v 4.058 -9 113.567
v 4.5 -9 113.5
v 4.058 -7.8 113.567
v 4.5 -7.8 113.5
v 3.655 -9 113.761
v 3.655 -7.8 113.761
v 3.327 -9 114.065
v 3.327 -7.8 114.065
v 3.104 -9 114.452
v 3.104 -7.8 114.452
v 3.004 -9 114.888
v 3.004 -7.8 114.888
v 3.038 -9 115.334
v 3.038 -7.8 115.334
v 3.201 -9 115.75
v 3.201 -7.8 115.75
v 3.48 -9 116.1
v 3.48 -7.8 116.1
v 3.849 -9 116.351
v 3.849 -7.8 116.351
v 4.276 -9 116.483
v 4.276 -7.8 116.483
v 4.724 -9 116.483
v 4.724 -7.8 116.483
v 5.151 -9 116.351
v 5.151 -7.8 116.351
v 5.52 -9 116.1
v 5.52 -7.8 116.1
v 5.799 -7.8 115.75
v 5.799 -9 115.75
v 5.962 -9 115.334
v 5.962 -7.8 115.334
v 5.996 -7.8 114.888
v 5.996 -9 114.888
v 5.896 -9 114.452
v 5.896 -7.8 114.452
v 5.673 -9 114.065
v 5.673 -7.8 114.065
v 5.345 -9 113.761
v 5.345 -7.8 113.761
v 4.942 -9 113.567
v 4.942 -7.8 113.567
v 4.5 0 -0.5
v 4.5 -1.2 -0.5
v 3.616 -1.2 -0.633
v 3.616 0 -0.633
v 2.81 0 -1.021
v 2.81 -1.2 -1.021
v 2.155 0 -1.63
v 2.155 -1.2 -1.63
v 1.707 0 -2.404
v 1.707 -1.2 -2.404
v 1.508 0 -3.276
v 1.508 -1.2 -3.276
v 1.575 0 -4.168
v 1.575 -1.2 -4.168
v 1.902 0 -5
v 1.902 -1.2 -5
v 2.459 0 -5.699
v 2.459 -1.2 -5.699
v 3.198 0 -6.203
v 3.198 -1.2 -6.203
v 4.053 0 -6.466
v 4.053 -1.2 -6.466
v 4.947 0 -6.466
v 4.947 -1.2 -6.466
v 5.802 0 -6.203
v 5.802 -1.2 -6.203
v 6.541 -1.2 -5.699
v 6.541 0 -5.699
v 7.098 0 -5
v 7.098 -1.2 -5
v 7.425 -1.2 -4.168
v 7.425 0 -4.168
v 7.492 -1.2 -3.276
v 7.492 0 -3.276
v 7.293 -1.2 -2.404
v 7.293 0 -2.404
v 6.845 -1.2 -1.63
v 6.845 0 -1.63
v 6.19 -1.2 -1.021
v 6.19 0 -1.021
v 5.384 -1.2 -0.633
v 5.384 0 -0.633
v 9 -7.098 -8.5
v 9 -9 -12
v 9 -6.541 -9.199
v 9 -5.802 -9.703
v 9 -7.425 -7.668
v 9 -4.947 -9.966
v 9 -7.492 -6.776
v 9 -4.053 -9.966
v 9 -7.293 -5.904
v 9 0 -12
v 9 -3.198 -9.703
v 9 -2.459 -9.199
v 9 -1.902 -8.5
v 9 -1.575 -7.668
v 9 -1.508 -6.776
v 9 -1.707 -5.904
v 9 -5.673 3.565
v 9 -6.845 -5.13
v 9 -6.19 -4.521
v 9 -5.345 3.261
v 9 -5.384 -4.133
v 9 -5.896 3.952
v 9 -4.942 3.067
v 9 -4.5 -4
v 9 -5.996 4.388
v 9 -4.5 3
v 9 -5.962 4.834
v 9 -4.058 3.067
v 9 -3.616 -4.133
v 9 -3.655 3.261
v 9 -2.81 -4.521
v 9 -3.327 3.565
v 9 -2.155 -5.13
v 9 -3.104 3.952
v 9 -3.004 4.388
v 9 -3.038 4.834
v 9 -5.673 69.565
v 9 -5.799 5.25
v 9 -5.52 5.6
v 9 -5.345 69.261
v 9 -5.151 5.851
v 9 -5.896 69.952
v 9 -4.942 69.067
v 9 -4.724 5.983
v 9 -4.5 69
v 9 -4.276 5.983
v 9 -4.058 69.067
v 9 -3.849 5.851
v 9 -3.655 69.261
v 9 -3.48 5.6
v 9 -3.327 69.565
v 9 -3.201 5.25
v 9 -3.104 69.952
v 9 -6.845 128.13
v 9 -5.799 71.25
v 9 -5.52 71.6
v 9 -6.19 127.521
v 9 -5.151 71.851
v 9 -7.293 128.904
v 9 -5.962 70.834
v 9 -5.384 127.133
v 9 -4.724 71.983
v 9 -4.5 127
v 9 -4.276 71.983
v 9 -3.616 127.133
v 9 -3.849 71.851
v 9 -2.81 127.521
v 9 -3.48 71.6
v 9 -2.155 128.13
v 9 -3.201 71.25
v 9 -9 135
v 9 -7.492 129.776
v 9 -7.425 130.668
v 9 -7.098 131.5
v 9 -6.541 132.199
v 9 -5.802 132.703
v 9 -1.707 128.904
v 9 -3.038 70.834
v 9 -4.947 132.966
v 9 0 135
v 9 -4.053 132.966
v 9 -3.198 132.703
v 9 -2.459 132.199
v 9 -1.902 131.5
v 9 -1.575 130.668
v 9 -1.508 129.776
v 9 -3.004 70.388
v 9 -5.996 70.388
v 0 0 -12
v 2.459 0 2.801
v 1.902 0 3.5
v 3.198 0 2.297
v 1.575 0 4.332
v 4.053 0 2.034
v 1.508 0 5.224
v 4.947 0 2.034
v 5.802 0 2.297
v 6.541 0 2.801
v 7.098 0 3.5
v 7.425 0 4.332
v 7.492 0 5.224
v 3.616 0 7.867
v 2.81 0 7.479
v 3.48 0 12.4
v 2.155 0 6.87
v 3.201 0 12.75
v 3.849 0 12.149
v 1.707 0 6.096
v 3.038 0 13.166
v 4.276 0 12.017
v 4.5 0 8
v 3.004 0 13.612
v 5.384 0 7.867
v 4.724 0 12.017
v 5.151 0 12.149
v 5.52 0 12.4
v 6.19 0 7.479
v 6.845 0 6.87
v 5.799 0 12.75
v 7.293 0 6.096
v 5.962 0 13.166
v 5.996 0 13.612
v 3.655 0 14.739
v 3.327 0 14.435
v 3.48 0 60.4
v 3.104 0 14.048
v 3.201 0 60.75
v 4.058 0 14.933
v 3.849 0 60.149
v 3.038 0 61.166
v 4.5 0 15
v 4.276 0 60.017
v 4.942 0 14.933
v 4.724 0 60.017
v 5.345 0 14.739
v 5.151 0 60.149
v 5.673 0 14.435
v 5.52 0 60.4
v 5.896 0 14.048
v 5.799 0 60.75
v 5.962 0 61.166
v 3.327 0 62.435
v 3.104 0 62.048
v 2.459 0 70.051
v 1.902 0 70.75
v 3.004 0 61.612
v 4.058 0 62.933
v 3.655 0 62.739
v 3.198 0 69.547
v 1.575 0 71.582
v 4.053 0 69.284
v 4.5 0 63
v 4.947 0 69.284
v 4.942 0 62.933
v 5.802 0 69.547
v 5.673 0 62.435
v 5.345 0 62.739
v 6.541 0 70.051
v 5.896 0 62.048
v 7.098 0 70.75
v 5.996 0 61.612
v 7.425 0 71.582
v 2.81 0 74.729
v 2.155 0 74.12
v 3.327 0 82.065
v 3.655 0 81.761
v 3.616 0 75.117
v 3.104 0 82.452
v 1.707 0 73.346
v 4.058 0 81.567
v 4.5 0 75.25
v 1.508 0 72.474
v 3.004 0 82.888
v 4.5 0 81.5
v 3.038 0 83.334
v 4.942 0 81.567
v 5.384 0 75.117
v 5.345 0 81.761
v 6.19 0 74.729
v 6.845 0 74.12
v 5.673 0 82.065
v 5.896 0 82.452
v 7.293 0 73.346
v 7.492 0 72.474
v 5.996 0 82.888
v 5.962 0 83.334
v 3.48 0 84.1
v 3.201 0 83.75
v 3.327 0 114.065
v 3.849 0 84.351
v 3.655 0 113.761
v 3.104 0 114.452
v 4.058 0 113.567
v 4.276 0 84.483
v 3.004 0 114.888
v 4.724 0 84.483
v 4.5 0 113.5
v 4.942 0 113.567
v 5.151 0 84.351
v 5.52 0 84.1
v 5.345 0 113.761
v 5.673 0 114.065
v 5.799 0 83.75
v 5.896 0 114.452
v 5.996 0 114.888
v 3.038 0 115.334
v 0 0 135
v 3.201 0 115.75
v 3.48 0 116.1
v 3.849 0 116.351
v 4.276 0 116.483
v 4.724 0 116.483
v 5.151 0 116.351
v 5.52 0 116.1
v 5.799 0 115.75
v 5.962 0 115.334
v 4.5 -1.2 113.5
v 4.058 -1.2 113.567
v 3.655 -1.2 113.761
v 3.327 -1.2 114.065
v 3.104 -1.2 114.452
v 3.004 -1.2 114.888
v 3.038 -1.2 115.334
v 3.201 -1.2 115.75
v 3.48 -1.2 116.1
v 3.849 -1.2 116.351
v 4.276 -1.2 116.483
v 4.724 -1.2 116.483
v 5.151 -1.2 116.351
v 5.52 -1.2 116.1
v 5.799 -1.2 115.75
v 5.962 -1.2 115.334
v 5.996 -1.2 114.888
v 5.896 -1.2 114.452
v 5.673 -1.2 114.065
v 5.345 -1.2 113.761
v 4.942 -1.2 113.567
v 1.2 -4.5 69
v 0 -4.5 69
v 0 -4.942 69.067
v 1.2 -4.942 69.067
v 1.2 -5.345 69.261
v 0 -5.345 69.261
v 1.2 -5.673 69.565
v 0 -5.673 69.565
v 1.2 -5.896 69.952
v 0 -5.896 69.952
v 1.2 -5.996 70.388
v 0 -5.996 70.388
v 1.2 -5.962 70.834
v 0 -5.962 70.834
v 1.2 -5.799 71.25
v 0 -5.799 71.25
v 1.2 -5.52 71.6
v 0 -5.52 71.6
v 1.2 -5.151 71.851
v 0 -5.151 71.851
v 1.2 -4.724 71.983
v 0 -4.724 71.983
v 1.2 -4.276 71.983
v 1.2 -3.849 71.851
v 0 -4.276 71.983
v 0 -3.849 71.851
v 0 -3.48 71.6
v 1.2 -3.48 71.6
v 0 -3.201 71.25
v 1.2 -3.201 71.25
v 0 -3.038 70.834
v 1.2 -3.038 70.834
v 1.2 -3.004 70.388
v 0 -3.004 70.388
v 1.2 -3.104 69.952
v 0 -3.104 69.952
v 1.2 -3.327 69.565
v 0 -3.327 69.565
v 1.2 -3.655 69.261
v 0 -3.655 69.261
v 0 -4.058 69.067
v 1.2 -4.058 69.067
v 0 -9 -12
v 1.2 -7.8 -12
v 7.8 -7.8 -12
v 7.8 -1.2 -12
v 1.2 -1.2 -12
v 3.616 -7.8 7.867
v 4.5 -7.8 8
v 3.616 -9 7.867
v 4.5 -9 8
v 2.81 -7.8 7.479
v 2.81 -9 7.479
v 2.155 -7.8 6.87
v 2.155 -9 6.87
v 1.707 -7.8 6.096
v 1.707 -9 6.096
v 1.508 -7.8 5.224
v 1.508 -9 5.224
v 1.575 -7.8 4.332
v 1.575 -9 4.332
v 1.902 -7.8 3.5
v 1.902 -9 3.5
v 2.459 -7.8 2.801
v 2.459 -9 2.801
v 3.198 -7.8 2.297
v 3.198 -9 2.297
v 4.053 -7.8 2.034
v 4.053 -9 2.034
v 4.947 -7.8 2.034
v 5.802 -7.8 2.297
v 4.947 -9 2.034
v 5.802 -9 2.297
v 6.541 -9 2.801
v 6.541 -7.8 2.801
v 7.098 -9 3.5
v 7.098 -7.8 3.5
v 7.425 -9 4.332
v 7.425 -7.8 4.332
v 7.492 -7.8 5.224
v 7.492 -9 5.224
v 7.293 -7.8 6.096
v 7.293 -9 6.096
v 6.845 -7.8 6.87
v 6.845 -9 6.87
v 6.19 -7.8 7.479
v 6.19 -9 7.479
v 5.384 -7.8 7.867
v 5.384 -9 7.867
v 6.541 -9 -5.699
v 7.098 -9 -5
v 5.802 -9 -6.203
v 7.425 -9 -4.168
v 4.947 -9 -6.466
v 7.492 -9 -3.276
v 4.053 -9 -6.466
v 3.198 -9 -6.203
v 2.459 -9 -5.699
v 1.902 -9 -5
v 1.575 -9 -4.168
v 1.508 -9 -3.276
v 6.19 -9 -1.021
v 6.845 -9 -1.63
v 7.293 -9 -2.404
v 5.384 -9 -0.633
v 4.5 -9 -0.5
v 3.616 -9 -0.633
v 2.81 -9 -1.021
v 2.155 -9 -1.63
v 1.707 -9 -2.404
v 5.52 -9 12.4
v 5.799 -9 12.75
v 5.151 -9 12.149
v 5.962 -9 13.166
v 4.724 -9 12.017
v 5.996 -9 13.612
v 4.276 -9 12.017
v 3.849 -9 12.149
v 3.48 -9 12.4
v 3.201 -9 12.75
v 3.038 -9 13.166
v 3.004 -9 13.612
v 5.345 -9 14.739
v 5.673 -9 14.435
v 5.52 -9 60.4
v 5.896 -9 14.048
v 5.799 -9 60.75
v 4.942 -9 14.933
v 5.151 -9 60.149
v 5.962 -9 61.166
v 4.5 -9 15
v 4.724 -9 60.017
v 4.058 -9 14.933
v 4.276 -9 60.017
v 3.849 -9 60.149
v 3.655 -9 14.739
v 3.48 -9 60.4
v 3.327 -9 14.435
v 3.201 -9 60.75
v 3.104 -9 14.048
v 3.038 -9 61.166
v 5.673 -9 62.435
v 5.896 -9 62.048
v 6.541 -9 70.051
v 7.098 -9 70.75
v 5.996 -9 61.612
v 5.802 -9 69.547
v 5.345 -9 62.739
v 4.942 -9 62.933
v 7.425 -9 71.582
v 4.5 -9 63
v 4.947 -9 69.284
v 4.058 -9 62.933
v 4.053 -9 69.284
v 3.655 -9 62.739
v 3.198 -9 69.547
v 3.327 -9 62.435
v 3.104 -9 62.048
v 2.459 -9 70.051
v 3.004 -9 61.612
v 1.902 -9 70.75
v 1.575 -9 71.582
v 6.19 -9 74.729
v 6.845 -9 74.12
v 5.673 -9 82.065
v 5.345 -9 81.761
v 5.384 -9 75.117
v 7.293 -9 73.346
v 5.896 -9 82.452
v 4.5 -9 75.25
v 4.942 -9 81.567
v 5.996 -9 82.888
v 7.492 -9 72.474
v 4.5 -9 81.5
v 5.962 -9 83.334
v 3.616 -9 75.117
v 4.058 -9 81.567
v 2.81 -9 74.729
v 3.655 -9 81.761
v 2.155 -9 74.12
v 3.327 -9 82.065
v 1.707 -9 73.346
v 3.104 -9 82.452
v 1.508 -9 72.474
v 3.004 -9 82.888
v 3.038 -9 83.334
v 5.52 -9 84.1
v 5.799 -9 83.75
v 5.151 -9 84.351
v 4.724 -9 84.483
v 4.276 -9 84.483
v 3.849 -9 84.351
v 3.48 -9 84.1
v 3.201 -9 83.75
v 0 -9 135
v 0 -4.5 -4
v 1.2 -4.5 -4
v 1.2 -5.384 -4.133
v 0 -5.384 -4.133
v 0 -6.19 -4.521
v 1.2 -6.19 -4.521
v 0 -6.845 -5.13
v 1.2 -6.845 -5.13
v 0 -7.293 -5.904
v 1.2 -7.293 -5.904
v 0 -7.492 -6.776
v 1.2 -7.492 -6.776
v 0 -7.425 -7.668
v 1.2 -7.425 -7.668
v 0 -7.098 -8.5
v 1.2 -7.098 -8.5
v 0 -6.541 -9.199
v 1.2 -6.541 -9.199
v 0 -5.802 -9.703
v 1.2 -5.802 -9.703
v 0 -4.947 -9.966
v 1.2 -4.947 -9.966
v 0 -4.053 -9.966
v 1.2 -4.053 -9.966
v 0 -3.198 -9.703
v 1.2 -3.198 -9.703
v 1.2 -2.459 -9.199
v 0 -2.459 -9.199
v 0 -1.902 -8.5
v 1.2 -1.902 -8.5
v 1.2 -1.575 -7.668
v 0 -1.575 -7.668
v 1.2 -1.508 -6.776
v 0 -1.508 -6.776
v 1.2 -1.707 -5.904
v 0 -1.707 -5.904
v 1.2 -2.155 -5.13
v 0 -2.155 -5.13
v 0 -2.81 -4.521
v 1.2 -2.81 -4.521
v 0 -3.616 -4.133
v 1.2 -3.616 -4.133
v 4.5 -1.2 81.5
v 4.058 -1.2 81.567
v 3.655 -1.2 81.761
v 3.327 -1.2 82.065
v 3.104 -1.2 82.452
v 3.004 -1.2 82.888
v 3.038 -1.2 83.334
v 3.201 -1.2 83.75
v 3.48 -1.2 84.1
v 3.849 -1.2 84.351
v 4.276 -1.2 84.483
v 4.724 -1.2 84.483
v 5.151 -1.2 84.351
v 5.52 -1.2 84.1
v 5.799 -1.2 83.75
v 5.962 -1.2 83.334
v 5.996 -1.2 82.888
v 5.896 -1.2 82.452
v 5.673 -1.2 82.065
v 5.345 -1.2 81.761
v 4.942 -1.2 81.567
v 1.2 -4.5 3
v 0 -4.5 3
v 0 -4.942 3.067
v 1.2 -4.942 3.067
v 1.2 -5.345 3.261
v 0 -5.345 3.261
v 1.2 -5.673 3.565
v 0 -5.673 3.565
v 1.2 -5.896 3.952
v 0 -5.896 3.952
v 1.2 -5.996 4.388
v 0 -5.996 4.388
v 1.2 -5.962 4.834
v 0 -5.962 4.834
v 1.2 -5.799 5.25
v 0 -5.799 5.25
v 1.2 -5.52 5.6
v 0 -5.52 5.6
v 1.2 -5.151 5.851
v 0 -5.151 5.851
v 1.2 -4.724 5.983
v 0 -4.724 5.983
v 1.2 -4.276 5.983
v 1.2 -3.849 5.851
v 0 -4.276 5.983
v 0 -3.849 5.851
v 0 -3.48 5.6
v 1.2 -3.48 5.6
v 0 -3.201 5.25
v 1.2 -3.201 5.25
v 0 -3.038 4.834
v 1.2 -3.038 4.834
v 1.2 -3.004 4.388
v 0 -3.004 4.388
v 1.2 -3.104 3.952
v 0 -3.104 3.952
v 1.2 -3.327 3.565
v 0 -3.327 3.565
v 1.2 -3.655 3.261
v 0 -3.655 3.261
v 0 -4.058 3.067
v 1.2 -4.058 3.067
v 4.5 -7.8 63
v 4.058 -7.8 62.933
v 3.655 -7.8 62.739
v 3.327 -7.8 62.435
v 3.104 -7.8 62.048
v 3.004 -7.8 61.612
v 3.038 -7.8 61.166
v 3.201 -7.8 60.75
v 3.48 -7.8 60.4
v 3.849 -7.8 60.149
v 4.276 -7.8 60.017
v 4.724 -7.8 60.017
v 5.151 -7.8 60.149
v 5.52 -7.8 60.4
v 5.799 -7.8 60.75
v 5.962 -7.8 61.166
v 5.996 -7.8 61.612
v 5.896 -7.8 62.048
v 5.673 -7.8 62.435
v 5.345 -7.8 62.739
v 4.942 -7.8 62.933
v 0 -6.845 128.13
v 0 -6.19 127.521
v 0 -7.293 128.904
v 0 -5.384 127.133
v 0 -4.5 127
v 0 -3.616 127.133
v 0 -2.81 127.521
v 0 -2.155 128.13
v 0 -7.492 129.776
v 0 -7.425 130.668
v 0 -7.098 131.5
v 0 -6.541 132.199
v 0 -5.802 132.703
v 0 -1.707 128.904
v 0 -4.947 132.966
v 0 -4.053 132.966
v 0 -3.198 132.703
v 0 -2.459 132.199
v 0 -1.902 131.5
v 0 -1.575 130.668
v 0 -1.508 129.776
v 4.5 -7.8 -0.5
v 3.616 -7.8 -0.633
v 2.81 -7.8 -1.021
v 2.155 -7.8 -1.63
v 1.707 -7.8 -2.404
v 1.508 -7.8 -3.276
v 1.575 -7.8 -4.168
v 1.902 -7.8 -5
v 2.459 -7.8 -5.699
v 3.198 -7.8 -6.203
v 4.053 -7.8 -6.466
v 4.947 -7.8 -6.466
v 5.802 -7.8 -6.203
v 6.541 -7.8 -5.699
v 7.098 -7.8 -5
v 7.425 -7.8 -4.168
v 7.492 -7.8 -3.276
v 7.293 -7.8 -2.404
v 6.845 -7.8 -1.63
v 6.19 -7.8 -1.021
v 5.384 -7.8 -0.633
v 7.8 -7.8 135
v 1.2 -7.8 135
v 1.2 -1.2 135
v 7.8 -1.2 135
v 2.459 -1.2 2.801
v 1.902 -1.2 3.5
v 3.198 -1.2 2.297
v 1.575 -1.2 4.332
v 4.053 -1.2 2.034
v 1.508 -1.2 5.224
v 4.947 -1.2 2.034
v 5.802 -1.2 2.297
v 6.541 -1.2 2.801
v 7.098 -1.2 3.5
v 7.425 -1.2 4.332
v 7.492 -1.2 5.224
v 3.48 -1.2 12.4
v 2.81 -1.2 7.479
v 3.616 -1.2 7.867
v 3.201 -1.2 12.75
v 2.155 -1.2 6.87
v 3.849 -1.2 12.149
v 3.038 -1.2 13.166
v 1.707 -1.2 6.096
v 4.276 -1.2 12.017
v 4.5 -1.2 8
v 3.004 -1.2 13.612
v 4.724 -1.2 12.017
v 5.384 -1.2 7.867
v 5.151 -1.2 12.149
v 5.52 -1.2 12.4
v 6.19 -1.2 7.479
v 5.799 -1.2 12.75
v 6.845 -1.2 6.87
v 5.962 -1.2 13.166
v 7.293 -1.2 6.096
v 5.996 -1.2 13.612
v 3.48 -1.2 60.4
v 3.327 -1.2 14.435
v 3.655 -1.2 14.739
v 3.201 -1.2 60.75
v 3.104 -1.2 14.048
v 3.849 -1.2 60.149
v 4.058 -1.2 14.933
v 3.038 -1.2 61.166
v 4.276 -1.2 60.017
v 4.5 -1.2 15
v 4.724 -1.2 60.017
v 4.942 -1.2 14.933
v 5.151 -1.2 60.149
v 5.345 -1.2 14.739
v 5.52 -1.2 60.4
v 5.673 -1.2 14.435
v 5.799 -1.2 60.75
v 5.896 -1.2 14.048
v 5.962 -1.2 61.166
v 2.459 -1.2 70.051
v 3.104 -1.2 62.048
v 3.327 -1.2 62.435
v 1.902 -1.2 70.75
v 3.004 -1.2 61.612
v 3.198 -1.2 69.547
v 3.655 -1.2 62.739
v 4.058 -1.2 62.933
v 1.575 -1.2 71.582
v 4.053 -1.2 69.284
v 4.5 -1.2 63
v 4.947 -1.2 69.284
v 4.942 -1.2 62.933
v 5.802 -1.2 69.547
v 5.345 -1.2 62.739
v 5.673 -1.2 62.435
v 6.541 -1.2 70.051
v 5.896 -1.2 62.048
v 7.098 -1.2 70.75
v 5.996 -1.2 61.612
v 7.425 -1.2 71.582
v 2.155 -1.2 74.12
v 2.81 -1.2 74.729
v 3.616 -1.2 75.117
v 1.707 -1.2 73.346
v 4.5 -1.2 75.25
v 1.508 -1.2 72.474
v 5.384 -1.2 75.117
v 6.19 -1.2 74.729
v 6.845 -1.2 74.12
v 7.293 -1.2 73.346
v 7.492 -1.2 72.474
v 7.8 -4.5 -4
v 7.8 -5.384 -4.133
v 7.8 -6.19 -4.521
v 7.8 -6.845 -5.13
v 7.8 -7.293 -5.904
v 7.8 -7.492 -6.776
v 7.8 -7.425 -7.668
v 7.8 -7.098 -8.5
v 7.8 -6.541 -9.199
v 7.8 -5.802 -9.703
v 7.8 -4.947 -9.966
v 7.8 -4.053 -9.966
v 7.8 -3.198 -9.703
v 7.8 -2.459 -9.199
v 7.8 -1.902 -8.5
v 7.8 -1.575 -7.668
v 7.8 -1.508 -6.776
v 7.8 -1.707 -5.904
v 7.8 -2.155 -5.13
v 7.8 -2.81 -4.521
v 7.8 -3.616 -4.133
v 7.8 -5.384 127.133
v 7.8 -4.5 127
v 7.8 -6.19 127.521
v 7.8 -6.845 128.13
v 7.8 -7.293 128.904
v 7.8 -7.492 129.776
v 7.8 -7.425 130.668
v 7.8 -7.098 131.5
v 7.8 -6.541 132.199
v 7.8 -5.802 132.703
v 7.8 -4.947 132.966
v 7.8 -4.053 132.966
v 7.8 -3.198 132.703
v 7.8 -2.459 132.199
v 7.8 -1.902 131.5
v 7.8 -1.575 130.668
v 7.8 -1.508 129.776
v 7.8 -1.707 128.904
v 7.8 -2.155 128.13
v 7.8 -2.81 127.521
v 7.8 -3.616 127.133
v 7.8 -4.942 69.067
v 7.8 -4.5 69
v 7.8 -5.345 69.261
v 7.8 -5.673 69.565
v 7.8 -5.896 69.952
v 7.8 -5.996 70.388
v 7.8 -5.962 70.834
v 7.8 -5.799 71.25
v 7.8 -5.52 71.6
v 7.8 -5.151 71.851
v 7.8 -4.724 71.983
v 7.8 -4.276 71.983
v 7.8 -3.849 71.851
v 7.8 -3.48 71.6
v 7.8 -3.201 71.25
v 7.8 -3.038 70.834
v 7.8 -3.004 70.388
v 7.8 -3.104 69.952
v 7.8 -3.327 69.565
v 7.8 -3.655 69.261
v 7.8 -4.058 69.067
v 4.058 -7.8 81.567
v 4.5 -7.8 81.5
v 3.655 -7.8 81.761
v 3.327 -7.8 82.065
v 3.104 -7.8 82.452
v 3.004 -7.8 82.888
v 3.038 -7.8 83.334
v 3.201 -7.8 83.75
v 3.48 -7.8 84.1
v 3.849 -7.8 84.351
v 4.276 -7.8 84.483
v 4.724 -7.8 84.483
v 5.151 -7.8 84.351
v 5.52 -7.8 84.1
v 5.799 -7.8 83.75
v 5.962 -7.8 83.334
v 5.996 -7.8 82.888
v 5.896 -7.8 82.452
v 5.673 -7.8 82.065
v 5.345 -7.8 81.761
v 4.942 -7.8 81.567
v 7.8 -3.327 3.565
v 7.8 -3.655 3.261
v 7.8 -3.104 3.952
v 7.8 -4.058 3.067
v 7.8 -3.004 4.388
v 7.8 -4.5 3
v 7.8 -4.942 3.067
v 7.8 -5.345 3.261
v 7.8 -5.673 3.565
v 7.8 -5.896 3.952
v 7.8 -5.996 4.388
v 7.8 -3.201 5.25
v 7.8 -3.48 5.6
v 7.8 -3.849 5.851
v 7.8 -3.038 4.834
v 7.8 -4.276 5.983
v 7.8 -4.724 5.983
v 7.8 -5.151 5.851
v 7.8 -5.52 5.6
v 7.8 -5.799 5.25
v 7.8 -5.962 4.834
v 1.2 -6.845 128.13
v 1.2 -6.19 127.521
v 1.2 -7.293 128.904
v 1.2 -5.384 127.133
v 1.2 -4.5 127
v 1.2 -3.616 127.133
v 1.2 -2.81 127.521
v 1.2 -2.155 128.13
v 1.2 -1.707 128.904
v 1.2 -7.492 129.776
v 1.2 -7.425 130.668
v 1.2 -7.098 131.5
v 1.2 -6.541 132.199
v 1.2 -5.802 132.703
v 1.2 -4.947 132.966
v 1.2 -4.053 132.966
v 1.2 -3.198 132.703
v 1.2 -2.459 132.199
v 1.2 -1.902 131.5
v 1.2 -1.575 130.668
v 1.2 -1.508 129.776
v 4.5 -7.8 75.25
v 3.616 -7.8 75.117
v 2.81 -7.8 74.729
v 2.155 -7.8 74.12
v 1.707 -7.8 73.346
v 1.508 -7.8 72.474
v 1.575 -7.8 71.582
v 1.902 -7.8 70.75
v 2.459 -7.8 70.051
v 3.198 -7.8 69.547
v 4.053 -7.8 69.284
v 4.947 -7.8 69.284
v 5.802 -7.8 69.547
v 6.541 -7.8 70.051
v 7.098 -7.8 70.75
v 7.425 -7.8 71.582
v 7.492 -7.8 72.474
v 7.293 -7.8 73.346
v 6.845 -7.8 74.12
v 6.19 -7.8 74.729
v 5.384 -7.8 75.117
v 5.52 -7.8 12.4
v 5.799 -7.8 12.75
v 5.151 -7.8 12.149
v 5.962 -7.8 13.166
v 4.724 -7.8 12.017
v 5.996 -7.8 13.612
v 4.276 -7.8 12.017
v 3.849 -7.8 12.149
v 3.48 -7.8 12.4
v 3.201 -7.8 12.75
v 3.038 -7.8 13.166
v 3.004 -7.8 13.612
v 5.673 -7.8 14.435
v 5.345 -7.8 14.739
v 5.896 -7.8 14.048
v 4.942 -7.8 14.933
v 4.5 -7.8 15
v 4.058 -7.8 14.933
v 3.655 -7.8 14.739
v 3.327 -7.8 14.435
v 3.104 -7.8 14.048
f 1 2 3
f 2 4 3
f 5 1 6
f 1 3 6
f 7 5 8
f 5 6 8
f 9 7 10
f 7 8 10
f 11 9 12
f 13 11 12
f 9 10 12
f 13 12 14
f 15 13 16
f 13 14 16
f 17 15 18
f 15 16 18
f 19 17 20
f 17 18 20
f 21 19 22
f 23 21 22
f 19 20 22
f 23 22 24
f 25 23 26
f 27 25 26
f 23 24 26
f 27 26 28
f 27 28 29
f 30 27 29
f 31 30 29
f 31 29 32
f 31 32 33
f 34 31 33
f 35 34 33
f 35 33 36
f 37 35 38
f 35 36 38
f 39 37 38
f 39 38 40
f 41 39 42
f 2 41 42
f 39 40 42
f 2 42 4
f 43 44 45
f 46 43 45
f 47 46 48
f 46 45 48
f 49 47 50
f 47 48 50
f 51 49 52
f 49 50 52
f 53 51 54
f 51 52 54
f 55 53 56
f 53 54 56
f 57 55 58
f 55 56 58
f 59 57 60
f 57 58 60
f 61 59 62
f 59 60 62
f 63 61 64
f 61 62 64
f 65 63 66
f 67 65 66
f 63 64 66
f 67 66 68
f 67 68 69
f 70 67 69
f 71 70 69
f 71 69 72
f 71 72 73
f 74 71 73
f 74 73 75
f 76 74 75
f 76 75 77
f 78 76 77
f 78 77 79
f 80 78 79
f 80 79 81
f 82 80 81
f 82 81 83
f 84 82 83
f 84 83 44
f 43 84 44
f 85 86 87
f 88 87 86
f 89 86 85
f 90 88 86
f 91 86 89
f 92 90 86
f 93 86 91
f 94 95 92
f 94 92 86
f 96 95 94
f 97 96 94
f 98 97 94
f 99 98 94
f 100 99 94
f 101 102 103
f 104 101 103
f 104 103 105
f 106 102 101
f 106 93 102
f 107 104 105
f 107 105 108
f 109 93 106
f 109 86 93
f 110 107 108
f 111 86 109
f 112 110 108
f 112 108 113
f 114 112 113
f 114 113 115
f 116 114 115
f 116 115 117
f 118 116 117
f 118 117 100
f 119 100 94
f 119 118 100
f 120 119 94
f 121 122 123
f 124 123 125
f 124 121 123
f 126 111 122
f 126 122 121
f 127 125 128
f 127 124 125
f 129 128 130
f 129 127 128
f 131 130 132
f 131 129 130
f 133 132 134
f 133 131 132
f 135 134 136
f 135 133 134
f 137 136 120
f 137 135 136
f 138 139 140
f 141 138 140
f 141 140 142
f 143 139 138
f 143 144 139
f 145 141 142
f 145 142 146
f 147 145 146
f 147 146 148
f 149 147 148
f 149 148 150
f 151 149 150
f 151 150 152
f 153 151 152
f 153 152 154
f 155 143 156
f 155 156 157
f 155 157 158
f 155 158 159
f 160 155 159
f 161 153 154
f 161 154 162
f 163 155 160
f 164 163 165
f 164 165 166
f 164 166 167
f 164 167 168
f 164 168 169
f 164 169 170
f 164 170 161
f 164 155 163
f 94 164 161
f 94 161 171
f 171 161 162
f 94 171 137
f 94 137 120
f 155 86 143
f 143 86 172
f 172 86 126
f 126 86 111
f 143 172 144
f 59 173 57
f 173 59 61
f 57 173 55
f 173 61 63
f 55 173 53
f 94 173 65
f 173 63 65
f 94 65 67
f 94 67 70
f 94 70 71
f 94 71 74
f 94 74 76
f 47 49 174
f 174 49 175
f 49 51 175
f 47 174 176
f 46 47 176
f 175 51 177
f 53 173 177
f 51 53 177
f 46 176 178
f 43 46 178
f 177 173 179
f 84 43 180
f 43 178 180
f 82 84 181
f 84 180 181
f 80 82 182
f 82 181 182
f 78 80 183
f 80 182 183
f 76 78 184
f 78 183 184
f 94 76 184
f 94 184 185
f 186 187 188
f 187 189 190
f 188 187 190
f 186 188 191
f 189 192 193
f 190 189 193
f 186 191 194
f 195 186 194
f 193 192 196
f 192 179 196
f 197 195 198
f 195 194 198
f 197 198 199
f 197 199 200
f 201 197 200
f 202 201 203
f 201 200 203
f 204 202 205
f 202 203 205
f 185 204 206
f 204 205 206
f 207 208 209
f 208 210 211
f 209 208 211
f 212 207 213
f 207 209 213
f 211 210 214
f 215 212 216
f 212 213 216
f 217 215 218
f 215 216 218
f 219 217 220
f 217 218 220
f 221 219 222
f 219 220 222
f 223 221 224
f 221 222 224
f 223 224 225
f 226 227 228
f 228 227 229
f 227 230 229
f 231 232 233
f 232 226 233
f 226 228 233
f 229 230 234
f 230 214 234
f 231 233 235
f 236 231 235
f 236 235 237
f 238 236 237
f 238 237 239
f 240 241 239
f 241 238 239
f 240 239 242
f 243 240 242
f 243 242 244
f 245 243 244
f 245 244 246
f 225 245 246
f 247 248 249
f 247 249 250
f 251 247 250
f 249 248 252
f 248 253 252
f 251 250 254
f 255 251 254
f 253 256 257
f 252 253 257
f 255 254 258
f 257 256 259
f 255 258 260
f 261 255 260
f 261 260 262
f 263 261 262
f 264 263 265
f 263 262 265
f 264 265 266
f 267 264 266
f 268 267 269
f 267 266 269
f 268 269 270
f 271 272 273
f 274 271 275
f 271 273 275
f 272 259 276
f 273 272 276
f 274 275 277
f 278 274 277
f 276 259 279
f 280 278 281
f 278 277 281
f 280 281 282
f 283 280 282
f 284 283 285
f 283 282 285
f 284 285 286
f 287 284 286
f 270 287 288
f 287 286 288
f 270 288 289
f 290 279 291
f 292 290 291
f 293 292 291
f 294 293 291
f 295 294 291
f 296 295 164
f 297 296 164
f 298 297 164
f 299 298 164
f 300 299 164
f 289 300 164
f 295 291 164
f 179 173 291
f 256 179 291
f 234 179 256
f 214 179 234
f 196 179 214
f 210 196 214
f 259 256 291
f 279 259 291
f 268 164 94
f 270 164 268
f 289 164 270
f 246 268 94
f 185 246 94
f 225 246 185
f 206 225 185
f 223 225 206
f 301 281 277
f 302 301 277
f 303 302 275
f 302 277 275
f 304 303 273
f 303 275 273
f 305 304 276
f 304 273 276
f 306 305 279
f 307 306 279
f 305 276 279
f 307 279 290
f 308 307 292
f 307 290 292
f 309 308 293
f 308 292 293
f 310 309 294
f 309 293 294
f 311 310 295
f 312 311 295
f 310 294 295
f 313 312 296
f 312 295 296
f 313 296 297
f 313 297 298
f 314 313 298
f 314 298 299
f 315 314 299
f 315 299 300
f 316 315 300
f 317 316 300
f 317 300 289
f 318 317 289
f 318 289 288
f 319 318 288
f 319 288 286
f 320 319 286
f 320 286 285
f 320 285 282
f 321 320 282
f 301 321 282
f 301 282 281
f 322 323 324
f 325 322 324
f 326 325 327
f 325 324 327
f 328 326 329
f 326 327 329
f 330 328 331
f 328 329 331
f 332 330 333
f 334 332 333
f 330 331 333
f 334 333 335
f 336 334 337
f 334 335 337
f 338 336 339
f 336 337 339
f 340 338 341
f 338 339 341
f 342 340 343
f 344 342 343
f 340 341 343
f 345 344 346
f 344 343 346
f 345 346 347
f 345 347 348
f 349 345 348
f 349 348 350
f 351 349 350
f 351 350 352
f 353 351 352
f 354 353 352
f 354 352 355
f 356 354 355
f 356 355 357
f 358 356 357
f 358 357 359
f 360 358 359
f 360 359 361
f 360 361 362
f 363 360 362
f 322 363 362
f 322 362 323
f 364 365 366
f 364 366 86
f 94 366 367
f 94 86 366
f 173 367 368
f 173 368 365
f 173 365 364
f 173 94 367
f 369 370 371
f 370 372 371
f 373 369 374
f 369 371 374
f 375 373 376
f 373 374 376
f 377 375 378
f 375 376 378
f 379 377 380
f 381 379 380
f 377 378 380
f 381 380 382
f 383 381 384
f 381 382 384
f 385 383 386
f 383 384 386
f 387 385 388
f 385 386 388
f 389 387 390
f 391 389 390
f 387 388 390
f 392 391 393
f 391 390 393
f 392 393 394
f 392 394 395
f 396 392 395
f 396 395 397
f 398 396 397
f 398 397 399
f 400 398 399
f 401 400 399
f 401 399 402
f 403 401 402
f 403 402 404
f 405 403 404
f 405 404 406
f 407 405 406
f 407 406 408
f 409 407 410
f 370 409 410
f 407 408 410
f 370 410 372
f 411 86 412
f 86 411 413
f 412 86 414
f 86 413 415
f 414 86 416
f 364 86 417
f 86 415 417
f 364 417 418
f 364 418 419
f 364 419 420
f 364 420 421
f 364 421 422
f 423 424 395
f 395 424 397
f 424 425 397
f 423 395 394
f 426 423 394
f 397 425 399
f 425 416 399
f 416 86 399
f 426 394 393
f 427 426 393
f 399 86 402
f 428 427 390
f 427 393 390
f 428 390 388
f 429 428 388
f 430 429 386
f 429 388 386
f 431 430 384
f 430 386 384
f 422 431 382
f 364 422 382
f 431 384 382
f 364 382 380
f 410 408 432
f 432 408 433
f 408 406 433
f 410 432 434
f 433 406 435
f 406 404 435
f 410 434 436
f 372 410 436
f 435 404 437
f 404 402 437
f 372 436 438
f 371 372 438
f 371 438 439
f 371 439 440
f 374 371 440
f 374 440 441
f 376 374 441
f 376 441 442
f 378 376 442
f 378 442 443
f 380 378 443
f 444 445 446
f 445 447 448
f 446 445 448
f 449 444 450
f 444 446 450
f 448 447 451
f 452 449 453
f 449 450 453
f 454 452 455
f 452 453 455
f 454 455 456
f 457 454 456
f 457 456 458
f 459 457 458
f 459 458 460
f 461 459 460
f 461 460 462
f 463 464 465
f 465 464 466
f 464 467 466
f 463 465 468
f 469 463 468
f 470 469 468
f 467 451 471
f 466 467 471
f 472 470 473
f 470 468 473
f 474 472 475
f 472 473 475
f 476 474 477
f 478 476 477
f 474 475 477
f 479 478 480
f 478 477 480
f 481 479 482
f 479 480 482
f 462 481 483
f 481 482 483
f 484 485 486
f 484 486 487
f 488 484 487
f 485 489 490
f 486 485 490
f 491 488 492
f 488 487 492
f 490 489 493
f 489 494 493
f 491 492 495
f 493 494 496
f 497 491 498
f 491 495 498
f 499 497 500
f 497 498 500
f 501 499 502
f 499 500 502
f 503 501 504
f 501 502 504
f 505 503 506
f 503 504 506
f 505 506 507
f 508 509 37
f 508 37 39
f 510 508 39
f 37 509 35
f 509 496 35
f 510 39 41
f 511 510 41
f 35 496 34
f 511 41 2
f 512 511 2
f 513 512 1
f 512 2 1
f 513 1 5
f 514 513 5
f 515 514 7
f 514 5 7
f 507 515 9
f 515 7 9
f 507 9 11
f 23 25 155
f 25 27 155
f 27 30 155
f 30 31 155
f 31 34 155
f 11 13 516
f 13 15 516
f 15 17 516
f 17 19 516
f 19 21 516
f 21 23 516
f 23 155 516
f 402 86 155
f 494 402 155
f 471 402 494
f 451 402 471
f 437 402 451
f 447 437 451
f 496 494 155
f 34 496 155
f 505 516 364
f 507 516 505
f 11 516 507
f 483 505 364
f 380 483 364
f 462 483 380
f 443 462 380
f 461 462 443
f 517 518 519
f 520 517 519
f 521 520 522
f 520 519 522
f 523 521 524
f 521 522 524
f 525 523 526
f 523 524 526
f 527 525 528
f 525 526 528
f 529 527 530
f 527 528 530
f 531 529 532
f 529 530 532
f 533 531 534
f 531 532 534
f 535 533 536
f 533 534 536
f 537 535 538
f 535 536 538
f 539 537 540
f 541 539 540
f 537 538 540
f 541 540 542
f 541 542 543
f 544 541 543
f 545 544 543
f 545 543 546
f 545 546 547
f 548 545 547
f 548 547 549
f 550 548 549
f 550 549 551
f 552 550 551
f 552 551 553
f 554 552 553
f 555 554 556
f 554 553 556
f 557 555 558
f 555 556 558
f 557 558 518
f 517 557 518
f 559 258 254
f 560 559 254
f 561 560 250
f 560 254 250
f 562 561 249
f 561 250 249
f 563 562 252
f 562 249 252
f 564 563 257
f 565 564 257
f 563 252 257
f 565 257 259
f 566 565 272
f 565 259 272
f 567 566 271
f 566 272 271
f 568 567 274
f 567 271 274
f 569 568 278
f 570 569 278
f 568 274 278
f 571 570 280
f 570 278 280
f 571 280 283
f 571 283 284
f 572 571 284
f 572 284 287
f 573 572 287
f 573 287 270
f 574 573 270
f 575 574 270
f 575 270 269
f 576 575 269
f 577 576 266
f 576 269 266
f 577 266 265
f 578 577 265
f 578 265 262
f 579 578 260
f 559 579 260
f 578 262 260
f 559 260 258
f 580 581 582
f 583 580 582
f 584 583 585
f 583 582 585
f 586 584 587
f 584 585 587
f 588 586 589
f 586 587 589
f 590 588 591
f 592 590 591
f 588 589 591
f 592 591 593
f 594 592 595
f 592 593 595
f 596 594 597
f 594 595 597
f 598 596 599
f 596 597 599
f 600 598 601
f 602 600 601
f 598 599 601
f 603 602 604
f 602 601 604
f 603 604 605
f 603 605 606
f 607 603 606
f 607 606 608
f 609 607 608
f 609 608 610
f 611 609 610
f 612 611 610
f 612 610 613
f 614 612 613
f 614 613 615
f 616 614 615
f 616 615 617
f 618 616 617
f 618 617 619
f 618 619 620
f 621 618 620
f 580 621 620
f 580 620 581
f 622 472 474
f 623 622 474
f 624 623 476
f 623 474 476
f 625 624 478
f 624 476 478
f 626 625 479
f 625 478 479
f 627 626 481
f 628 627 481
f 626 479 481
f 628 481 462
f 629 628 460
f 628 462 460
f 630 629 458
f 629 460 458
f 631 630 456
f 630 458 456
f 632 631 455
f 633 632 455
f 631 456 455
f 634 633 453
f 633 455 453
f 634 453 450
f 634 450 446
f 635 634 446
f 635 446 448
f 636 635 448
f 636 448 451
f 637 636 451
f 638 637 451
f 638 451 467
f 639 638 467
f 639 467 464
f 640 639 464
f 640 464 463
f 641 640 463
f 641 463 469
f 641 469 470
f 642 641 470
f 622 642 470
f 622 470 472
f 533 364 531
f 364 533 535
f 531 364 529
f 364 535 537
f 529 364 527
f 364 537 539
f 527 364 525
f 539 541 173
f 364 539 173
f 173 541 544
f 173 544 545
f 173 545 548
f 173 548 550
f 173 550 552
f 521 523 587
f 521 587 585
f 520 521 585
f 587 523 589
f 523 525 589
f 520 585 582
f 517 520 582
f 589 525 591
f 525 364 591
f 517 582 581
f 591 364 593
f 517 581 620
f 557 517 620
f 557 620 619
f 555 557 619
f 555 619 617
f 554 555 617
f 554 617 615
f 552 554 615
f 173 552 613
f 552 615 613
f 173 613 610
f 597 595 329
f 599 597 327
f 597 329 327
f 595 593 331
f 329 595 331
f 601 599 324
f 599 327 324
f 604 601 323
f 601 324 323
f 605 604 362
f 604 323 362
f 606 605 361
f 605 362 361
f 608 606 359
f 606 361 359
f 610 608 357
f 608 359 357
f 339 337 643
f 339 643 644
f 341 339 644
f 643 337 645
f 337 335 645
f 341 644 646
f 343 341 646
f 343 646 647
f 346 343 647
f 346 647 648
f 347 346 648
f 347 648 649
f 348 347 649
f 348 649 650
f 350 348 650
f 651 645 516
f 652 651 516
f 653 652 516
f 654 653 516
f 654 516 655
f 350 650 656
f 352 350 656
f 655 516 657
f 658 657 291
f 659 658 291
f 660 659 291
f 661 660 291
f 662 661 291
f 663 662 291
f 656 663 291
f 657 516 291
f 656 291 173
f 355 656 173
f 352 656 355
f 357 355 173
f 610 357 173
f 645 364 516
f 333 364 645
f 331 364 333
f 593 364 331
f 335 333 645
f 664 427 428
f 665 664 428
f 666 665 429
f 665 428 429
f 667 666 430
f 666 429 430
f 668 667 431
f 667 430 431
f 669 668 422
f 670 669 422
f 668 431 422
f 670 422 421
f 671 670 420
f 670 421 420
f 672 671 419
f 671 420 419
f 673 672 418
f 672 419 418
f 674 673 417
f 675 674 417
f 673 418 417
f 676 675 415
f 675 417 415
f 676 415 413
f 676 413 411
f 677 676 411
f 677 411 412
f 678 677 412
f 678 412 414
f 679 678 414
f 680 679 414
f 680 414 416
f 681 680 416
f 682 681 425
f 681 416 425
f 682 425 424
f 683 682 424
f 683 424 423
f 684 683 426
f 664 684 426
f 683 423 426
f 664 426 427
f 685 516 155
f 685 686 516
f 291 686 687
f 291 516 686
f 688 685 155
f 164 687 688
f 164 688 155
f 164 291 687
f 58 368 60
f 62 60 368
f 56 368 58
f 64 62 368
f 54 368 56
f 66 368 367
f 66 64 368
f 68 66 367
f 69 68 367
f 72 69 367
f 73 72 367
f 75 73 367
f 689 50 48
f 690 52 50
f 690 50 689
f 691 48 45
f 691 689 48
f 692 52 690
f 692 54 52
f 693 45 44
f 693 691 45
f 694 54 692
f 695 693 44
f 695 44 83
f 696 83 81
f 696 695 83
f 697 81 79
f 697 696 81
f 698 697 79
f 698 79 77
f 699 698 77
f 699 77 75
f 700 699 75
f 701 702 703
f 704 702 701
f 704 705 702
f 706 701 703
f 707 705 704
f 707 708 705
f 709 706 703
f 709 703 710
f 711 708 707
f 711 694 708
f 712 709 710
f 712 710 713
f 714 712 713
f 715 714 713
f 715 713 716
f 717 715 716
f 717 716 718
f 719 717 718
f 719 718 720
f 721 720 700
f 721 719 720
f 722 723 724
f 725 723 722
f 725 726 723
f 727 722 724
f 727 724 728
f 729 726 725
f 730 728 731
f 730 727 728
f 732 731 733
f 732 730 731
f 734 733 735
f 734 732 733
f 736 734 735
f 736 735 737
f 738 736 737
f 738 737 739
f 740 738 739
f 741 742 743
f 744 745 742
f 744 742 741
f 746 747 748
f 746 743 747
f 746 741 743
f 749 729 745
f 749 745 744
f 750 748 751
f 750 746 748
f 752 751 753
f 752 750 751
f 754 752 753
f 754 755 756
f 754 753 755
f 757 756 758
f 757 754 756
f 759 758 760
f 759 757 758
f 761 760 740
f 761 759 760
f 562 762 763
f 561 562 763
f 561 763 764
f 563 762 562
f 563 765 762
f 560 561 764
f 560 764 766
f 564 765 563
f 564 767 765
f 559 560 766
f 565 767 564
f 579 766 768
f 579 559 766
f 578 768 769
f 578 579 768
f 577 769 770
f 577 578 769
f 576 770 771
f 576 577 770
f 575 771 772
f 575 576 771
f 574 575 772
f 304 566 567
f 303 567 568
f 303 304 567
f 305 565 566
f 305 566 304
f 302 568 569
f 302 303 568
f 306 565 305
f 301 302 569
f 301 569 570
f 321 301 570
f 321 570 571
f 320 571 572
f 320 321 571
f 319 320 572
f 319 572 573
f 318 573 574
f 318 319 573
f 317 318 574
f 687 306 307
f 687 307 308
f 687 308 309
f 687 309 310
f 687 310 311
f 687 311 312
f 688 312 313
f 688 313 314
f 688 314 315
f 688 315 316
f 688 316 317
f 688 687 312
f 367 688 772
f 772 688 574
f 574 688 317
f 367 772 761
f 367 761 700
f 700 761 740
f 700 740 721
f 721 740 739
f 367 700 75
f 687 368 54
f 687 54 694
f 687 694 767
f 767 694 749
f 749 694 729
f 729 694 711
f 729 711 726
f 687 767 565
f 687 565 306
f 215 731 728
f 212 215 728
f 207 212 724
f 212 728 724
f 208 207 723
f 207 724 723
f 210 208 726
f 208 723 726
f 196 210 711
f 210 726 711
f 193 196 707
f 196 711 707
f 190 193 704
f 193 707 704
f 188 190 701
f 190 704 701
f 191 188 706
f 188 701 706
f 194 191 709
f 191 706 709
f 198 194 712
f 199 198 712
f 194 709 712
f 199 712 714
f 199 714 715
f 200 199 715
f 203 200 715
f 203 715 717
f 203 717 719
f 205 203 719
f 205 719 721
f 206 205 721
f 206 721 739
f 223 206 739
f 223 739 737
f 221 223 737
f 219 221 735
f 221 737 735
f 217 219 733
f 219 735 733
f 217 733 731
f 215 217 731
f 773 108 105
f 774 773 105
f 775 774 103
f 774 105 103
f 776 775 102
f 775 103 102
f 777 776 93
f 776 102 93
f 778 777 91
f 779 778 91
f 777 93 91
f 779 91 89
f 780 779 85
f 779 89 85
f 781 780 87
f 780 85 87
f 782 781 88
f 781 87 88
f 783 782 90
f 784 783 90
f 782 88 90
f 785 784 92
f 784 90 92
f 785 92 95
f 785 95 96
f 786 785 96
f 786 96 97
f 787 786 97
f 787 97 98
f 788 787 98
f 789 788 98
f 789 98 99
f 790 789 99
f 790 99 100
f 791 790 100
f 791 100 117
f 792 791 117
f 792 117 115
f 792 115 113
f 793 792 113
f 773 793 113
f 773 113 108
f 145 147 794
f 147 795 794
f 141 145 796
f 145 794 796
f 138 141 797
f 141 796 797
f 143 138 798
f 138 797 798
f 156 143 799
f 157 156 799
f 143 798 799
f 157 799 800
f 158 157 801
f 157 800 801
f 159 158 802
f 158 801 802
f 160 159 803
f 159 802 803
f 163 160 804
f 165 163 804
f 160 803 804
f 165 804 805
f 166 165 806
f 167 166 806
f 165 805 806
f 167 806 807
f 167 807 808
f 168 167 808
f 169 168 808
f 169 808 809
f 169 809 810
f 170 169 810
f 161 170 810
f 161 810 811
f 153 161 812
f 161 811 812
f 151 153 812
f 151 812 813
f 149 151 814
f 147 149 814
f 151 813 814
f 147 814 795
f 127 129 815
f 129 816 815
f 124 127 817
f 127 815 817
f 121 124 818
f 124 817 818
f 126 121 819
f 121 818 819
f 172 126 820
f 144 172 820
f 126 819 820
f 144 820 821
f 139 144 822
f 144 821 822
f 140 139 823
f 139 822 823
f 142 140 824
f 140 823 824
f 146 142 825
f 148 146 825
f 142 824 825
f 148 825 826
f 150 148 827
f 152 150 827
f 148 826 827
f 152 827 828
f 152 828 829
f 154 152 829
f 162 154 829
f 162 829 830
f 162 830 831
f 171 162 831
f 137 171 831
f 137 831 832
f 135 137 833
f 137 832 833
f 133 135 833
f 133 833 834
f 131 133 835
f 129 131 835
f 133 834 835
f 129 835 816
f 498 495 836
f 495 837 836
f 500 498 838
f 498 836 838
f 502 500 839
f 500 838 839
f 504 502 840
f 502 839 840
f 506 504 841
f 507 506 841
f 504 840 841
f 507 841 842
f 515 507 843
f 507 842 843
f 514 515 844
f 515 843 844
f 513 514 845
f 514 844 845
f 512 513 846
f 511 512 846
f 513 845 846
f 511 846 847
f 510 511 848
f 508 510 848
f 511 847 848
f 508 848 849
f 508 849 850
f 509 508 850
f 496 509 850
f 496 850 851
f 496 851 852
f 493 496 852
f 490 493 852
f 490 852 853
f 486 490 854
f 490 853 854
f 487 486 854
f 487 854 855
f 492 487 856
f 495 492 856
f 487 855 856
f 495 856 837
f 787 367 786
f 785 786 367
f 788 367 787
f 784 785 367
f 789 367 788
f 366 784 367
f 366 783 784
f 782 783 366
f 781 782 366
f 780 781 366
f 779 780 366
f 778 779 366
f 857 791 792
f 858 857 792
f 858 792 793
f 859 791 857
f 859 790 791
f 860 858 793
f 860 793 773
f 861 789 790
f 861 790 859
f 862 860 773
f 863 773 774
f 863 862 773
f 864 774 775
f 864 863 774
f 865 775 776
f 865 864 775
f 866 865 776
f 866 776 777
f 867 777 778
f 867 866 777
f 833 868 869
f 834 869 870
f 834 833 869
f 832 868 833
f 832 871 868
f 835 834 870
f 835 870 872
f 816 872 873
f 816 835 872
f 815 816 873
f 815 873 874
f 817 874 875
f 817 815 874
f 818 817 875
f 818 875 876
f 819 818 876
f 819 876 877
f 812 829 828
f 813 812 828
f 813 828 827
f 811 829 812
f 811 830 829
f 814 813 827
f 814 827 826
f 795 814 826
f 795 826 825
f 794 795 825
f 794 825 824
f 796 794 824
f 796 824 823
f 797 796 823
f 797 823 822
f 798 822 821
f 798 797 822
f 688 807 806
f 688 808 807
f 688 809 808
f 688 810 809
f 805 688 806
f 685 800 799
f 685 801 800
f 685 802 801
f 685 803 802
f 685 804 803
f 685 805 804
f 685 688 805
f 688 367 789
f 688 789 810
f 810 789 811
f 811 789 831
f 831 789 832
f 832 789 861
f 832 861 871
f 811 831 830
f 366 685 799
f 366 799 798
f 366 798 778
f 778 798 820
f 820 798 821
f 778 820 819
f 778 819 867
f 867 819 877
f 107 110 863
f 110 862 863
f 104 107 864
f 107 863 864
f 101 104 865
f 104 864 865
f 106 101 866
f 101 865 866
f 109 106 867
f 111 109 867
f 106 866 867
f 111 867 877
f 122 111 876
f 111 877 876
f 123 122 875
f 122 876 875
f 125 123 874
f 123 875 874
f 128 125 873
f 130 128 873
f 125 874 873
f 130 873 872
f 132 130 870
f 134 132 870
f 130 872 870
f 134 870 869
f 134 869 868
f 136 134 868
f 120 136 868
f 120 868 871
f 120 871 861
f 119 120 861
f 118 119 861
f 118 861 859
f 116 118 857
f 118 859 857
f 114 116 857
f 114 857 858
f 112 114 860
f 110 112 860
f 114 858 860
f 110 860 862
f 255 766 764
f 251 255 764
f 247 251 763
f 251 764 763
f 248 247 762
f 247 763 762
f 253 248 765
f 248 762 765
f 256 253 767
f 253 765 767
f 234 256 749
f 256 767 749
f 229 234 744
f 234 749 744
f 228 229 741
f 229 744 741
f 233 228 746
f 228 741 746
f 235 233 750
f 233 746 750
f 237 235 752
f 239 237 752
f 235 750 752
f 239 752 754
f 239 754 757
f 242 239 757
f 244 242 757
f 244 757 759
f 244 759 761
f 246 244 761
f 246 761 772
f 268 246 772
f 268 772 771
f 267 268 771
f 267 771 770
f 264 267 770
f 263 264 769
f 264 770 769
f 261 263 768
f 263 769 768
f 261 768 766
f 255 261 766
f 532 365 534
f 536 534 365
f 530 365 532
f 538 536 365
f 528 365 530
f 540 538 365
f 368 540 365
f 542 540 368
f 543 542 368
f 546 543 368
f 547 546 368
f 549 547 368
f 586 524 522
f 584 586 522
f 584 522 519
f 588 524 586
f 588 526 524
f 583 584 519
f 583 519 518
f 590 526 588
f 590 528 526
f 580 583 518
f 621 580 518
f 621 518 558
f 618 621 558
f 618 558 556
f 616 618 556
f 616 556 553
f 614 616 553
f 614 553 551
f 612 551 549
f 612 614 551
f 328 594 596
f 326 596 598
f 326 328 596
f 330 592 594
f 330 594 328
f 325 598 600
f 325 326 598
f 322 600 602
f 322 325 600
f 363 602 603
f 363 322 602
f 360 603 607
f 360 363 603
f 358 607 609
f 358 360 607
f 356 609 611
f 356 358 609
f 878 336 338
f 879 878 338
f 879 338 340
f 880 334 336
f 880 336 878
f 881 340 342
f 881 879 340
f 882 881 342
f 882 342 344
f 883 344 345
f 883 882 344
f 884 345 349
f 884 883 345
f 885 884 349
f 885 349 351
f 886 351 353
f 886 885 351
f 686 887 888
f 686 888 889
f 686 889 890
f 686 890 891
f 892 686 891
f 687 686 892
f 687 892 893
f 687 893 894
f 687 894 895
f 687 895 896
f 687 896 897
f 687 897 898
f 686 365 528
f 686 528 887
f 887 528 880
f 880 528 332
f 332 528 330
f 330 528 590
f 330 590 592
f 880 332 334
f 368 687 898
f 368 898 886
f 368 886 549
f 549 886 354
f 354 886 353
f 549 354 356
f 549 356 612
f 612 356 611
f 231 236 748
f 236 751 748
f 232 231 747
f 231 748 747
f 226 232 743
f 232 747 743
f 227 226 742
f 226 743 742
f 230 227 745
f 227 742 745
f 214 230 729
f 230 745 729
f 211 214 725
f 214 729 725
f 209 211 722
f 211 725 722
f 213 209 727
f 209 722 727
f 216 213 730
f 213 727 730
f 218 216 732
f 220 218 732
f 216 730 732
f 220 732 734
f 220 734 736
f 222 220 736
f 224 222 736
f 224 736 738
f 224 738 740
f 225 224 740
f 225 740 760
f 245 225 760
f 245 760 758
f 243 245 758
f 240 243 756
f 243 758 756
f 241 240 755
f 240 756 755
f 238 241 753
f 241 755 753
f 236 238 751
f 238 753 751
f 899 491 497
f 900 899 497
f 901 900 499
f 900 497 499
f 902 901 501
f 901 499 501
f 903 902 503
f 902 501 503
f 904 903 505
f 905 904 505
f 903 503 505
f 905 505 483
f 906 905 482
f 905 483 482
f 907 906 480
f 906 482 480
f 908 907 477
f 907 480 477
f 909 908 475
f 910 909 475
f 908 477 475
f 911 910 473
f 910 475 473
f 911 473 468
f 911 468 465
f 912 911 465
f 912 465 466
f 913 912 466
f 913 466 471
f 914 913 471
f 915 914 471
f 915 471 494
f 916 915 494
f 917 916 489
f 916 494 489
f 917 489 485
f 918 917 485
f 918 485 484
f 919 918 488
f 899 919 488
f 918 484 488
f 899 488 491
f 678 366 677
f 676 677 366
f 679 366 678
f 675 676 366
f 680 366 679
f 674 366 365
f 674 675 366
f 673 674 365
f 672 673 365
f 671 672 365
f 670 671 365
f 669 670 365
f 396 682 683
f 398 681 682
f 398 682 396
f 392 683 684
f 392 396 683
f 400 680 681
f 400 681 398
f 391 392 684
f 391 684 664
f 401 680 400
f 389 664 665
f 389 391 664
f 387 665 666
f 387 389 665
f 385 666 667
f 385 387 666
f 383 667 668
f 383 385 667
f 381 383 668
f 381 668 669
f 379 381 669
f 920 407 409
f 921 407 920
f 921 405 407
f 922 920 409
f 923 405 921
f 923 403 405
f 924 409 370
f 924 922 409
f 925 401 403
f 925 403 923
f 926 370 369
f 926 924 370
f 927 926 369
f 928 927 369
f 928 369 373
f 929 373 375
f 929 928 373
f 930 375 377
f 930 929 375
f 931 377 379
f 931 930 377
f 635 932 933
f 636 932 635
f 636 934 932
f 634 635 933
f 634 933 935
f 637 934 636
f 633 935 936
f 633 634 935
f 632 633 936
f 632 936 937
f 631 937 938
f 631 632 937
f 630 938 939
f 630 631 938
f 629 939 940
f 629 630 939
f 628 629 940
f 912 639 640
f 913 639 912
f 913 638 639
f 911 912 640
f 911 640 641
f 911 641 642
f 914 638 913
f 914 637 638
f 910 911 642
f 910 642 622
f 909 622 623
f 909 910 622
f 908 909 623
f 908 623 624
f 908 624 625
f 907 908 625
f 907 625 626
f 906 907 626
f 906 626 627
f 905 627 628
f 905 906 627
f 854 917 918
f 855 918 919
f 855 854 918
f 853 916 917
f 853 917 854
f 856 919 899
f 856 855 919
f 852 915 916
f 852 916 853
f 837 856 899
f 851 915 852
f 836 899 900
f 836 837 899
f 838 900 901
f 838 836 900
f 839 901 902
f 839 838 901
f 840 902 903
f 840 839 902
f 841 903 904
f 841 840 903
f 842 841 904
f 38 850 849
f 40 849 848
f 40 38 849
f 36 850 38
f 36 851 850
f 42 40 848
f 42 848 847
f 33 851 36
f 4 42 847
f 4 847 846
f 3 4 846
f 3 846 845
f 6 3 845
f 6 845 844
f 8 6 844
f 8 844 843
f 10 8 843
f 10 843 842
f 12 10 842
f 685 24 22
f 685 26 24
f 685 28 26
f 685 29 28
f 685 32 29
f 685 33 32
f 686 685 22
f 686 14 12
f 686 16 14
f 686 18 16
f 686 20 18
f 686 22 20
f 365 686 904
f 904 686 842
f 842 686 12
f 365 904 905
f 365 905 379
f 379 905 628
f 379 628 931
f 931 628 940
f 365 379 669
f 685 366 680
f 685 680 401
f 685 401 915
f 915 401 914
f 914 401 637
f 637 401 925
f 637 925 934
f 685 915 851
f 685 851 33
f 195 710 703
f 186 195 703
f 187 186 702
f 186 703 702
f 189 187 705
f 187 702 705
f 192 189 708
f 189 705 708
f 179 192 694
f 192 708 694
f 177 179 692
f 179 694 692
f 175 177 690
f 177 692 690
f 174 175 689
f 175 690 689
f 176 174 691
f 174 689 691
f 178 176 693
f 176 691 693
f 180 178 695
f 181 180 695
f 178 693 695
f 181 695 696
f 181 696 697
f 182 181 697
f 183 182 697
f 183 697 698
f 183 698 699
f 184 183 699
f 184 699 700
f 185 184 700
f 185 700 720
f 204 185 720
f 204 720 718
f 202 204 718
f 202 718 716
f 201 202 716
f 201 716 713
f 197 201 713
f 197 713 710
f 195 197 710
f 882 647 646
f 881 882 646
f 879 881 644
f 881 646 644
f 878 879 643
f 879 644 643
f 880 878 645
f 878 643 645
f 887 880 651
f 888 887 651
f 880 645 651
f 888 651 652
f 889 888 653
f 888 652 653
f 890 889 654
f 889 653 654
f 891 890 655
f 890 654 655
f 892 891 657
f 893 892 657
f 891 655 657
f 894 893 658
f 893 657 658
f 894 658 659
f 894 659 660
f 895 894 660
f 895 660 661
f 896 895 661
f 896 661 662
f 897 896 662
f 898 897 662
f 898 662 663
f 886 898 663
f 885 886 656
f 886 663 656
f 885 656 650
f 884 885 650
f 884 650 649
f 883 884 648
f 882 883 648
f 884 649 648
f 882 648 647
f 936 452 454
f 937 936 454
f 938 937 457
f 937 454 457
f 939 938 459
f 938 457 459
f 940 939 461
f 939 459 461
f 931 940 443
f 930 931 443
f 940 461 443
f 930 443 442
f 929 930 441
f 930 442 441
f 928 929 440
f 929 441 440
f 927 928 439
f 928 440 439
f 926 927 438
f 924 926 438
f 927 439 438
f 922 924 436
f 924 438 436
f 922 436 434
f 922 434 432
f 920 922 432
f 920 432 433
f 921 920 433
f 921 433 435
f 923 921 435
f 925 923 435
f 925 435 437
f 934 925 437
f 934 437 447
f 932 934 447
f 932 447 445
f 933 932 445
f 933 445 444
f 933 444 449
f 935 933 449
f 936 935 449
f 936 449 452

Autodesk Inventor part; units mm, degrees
ref_plane "YZ Plane" through (0, 0, 0) normal (1, 0, 0) x (0, 1, 0)
ref_plane "XZ Plane" through (0, 0, 0) normal (0, 1, 0) x (-1, 0, 0)
ref_plane "XY Plane" through (0, 0, 0) normal (0, 0, 1) x (1, 0, 0)
sketch "スケッチ1" plane through (0, 0, 0) normal (0, 0, 1) x (1, 0, 0)
  line L0 (0, 0) -> (9, 0)
  line L1 (9, 0) -> (9, -9)
  line L2 (9, -9) -> (0, -9)
  line L3 (0, -9) -> (0, 0)
  line L4 (1.2, -1.2) -> (7.8, -1.2)
  line L5 (7.8, -1.2) -> (7.8, -7.8)
  line L6 (7.8, -7.8) -> (1.2, -7.8)
  line L7 (1.2, -7.8) -> (1.2, -1.2)
  dimension "d0" = 9
  dimension "d1" = 9
  dimension "d2" = 6.6
  dimension "d3" = 6.6
  dimension "d4" = 1.2
  dimension "d5" = 1.2
extrude "押し出し1" add sketch "スケッチ1" along normal blind 75
sketch "スケッチ2" plane through (9, -9, 0) normal (1, 0, 0) x (0, 0, -1)
  line L0 (0, 9) -> (-75, 9) projected
  line L1 (0, 0) -> (0, 9) projected
  line L2 (-75, 0) -> (-75, 9) projected
  point P0 (-70.5, 4.5)
  point P1 (-4.5, 4.5)
  dimension "d8" = 4.5
  dimension "d9" = 4.5
  dimension "d10" = 4.5
  dimension "d11" = 4.5
hole "穴1" at (9, -4.5, 70.5) at (9, -4.5, 4.5) direction (-1, 0, 0) diameter 3 end through all
sketch "スケッチ3" plane through (0, 0, 0) normal (0, 1, 0) x (1, 0, 0)
  line L0 (0, 0) -> (0, -75) projected
  line L1 (9, 0) -> (0, 0) projected
  line L2 (9, -75) -> (0, -75) projected
  point P0 (4.5, -61.5)
  point P1 (4.5, -13.5)
  dimension "d19" = 4.5
  dimension "d20" = 4.5
  dimension "d21" = 13.5
  dimension "d22" = 13.5
hole "穴2" at (4.5, 0, 61.5) at (4.5, 0, 13.5) direction (0, -1, 0) diameter 3 end through all
sketch "スケッチ6" plane through (0, 0, 75) normal (0, 0, 1) x (1, 0, 0)
  line L0 (0, -9) -> (9, -9) projected
  line L1 (0, 0) -> (9, 0)
  line L2 (9, 0) -> (9, -9)
  line L3 (9, -9) -> (0, -9)
  line L4 (0, -9) -> (0, 0)
  line L5 (1.2, -1.2) -> (7.8, -1.2) projected
  line L6 (7.8, -1.2) -> (7.8, -7.8) projected
  line L7 (1.2, -1.2) -> (7.8, -1.2)
  line L8 (7.8, -1.2) -> (7.8, -7.8)
  line L9 (7.8, -7.8) -> (1.2, -7.8)
  line L10 (1.2, -7.8) -> (1.2, -1.2)
extrude "押し出し3" add sketch "スケッチ6" along normal blind 60
sketch "スケッチ7" plane through (9, -9, 0) normal (1, 0, 0) x (0, 0, -1)
  line L0 (-135, 0) -> (-135, 9) projected
  line L1 (0, 9) -> (-135, 9) projected
  point P0 (-130, 4.5)
  dimension "d43" = 5
  dimension "d44" = 4.5
hole "穴4" at (9, -4.5, 130) direction (-1, 0, 0) diameter 6 end through all
sketch "スケッチ8" plane through (0, 0, 0) normal (0, 0, -1) x (-1, 0, 0)
  line L0 (-9, -9) -> (-9, 0) projected
  line L1 (0, 0) -> (-9, 0)
  line L2 (-9, 0) -> (-9, -9)
  line L3 (-9, -9) -> (0, -9)
  line L4 (0, -9) -> (0, 0)
  line L5 (-7.8, -7.8) -> (-1.2, -7.8) projected
  line L6 (-7.8, -7.8) -> (-1.2, -7.8)
  line L7 (-1.2, -7.8) -> (-1.2, -1.2)
  line L8 (-1.2, -1.2) -> (-7.8, -1.2)
  line L9 (-7.8, -1.2) -> (-7.8, -7.8)
extrude "押し出し4" add sketch "スケッチ8" along normal blind 12
sketch "スケッチ9" plane through (0, -9, 135) normal (-1, 0, 0) x (0, 0, 1)
  line L0 (-147, 0) -> (-147, 9) projected
  line L1 (0, 0) -> (-147, 0) projected
  point P0 (-135, 9)
  point P1 (-142, 4.5)
  dimension "d54" = 5
  dimension "d55" = 4.5
hole "穴5" at (0, -4.5, -7) direction (1, 0, 0) diameter 6 end through all
sketch "スケッチ10" plane through (0, -9, 135) normal (0, -1, 0) x (1, 0, 0)
  line L0 (0, 0) -> (9, 0) projected
  line L1 (0, 0) -> (0, -147) projected
  point P0 (0, -135)
  point P1 (4.5, -52)
  point P2 (4.5, -20)
  dimension "d63" = 20
  dimension "d64" = 32
  dimension "d65" = 4.5
  dimension "d66" = 4.5
hole "穴6" at (4.5, -9, 83) at (4.5, -9, 115) direction (0, 1, 0) diameter 3 end through all
sketch "スケッチ11" plane through (0, -9, 135) normal (-1, 0, 0) x (0, 0, 1)
  point P0 (-135, 9)
sketch "スケッチ12" plane through (0, 0, 135) normal (0, 1, 0) x (1, 0, 0)
  line L0 (0, 147) -> (0, 0) projected
  line L1 (0, 147) -> (9, 147) projected
  circle A0 centre (4.5, 121.5) radius 1.5 projected
  point P0 (0, 135)
  point P1 (4.5, 138.5)
  point P2 (4.5, 130)
  dimension "d74" = 4.5
  dimension "d75" = 25.5
  dimension "d76" = 8.5
  dimension "d77" = 8.5
  dimension "d78" = 4.5
hole "穴7" at (4.5, 0, 5) at (4.5, 0, -3.5) direction (0, -1, 0) diameter 6 end through all
sketch "スケッチ13" plane through (0, 0, 135) normal (0, 1, 0) x (1, 0, 0)
  circle A0 centre (4.5, 52) radius 1.5 projected
  circle A1 centre (4.5, 73.5) radius 1.5 projected
  line L0 (0, 147) -> (0, 0) projected
  point P0 (0, 135)
  point P1 (4.5, 62.75)
  dimension "d86" = 21.5
  dimension "d87" = 10.75
  dimension "d88" = 4.5
hole "穴8" at (4.5, 0, 72.25) direction (0, -1, 0) diameter 6 end through all
equation "\"d10\" = d9"
equation "\"d22\" = d21"
equation "\"d76\" = 0.333333 * d75"
equation "\"d77\" = d76"
equation "\"d87\" = 0.5 * d86"
properties part number "上下直動9x9_3" material "アルミニウム 6061"
